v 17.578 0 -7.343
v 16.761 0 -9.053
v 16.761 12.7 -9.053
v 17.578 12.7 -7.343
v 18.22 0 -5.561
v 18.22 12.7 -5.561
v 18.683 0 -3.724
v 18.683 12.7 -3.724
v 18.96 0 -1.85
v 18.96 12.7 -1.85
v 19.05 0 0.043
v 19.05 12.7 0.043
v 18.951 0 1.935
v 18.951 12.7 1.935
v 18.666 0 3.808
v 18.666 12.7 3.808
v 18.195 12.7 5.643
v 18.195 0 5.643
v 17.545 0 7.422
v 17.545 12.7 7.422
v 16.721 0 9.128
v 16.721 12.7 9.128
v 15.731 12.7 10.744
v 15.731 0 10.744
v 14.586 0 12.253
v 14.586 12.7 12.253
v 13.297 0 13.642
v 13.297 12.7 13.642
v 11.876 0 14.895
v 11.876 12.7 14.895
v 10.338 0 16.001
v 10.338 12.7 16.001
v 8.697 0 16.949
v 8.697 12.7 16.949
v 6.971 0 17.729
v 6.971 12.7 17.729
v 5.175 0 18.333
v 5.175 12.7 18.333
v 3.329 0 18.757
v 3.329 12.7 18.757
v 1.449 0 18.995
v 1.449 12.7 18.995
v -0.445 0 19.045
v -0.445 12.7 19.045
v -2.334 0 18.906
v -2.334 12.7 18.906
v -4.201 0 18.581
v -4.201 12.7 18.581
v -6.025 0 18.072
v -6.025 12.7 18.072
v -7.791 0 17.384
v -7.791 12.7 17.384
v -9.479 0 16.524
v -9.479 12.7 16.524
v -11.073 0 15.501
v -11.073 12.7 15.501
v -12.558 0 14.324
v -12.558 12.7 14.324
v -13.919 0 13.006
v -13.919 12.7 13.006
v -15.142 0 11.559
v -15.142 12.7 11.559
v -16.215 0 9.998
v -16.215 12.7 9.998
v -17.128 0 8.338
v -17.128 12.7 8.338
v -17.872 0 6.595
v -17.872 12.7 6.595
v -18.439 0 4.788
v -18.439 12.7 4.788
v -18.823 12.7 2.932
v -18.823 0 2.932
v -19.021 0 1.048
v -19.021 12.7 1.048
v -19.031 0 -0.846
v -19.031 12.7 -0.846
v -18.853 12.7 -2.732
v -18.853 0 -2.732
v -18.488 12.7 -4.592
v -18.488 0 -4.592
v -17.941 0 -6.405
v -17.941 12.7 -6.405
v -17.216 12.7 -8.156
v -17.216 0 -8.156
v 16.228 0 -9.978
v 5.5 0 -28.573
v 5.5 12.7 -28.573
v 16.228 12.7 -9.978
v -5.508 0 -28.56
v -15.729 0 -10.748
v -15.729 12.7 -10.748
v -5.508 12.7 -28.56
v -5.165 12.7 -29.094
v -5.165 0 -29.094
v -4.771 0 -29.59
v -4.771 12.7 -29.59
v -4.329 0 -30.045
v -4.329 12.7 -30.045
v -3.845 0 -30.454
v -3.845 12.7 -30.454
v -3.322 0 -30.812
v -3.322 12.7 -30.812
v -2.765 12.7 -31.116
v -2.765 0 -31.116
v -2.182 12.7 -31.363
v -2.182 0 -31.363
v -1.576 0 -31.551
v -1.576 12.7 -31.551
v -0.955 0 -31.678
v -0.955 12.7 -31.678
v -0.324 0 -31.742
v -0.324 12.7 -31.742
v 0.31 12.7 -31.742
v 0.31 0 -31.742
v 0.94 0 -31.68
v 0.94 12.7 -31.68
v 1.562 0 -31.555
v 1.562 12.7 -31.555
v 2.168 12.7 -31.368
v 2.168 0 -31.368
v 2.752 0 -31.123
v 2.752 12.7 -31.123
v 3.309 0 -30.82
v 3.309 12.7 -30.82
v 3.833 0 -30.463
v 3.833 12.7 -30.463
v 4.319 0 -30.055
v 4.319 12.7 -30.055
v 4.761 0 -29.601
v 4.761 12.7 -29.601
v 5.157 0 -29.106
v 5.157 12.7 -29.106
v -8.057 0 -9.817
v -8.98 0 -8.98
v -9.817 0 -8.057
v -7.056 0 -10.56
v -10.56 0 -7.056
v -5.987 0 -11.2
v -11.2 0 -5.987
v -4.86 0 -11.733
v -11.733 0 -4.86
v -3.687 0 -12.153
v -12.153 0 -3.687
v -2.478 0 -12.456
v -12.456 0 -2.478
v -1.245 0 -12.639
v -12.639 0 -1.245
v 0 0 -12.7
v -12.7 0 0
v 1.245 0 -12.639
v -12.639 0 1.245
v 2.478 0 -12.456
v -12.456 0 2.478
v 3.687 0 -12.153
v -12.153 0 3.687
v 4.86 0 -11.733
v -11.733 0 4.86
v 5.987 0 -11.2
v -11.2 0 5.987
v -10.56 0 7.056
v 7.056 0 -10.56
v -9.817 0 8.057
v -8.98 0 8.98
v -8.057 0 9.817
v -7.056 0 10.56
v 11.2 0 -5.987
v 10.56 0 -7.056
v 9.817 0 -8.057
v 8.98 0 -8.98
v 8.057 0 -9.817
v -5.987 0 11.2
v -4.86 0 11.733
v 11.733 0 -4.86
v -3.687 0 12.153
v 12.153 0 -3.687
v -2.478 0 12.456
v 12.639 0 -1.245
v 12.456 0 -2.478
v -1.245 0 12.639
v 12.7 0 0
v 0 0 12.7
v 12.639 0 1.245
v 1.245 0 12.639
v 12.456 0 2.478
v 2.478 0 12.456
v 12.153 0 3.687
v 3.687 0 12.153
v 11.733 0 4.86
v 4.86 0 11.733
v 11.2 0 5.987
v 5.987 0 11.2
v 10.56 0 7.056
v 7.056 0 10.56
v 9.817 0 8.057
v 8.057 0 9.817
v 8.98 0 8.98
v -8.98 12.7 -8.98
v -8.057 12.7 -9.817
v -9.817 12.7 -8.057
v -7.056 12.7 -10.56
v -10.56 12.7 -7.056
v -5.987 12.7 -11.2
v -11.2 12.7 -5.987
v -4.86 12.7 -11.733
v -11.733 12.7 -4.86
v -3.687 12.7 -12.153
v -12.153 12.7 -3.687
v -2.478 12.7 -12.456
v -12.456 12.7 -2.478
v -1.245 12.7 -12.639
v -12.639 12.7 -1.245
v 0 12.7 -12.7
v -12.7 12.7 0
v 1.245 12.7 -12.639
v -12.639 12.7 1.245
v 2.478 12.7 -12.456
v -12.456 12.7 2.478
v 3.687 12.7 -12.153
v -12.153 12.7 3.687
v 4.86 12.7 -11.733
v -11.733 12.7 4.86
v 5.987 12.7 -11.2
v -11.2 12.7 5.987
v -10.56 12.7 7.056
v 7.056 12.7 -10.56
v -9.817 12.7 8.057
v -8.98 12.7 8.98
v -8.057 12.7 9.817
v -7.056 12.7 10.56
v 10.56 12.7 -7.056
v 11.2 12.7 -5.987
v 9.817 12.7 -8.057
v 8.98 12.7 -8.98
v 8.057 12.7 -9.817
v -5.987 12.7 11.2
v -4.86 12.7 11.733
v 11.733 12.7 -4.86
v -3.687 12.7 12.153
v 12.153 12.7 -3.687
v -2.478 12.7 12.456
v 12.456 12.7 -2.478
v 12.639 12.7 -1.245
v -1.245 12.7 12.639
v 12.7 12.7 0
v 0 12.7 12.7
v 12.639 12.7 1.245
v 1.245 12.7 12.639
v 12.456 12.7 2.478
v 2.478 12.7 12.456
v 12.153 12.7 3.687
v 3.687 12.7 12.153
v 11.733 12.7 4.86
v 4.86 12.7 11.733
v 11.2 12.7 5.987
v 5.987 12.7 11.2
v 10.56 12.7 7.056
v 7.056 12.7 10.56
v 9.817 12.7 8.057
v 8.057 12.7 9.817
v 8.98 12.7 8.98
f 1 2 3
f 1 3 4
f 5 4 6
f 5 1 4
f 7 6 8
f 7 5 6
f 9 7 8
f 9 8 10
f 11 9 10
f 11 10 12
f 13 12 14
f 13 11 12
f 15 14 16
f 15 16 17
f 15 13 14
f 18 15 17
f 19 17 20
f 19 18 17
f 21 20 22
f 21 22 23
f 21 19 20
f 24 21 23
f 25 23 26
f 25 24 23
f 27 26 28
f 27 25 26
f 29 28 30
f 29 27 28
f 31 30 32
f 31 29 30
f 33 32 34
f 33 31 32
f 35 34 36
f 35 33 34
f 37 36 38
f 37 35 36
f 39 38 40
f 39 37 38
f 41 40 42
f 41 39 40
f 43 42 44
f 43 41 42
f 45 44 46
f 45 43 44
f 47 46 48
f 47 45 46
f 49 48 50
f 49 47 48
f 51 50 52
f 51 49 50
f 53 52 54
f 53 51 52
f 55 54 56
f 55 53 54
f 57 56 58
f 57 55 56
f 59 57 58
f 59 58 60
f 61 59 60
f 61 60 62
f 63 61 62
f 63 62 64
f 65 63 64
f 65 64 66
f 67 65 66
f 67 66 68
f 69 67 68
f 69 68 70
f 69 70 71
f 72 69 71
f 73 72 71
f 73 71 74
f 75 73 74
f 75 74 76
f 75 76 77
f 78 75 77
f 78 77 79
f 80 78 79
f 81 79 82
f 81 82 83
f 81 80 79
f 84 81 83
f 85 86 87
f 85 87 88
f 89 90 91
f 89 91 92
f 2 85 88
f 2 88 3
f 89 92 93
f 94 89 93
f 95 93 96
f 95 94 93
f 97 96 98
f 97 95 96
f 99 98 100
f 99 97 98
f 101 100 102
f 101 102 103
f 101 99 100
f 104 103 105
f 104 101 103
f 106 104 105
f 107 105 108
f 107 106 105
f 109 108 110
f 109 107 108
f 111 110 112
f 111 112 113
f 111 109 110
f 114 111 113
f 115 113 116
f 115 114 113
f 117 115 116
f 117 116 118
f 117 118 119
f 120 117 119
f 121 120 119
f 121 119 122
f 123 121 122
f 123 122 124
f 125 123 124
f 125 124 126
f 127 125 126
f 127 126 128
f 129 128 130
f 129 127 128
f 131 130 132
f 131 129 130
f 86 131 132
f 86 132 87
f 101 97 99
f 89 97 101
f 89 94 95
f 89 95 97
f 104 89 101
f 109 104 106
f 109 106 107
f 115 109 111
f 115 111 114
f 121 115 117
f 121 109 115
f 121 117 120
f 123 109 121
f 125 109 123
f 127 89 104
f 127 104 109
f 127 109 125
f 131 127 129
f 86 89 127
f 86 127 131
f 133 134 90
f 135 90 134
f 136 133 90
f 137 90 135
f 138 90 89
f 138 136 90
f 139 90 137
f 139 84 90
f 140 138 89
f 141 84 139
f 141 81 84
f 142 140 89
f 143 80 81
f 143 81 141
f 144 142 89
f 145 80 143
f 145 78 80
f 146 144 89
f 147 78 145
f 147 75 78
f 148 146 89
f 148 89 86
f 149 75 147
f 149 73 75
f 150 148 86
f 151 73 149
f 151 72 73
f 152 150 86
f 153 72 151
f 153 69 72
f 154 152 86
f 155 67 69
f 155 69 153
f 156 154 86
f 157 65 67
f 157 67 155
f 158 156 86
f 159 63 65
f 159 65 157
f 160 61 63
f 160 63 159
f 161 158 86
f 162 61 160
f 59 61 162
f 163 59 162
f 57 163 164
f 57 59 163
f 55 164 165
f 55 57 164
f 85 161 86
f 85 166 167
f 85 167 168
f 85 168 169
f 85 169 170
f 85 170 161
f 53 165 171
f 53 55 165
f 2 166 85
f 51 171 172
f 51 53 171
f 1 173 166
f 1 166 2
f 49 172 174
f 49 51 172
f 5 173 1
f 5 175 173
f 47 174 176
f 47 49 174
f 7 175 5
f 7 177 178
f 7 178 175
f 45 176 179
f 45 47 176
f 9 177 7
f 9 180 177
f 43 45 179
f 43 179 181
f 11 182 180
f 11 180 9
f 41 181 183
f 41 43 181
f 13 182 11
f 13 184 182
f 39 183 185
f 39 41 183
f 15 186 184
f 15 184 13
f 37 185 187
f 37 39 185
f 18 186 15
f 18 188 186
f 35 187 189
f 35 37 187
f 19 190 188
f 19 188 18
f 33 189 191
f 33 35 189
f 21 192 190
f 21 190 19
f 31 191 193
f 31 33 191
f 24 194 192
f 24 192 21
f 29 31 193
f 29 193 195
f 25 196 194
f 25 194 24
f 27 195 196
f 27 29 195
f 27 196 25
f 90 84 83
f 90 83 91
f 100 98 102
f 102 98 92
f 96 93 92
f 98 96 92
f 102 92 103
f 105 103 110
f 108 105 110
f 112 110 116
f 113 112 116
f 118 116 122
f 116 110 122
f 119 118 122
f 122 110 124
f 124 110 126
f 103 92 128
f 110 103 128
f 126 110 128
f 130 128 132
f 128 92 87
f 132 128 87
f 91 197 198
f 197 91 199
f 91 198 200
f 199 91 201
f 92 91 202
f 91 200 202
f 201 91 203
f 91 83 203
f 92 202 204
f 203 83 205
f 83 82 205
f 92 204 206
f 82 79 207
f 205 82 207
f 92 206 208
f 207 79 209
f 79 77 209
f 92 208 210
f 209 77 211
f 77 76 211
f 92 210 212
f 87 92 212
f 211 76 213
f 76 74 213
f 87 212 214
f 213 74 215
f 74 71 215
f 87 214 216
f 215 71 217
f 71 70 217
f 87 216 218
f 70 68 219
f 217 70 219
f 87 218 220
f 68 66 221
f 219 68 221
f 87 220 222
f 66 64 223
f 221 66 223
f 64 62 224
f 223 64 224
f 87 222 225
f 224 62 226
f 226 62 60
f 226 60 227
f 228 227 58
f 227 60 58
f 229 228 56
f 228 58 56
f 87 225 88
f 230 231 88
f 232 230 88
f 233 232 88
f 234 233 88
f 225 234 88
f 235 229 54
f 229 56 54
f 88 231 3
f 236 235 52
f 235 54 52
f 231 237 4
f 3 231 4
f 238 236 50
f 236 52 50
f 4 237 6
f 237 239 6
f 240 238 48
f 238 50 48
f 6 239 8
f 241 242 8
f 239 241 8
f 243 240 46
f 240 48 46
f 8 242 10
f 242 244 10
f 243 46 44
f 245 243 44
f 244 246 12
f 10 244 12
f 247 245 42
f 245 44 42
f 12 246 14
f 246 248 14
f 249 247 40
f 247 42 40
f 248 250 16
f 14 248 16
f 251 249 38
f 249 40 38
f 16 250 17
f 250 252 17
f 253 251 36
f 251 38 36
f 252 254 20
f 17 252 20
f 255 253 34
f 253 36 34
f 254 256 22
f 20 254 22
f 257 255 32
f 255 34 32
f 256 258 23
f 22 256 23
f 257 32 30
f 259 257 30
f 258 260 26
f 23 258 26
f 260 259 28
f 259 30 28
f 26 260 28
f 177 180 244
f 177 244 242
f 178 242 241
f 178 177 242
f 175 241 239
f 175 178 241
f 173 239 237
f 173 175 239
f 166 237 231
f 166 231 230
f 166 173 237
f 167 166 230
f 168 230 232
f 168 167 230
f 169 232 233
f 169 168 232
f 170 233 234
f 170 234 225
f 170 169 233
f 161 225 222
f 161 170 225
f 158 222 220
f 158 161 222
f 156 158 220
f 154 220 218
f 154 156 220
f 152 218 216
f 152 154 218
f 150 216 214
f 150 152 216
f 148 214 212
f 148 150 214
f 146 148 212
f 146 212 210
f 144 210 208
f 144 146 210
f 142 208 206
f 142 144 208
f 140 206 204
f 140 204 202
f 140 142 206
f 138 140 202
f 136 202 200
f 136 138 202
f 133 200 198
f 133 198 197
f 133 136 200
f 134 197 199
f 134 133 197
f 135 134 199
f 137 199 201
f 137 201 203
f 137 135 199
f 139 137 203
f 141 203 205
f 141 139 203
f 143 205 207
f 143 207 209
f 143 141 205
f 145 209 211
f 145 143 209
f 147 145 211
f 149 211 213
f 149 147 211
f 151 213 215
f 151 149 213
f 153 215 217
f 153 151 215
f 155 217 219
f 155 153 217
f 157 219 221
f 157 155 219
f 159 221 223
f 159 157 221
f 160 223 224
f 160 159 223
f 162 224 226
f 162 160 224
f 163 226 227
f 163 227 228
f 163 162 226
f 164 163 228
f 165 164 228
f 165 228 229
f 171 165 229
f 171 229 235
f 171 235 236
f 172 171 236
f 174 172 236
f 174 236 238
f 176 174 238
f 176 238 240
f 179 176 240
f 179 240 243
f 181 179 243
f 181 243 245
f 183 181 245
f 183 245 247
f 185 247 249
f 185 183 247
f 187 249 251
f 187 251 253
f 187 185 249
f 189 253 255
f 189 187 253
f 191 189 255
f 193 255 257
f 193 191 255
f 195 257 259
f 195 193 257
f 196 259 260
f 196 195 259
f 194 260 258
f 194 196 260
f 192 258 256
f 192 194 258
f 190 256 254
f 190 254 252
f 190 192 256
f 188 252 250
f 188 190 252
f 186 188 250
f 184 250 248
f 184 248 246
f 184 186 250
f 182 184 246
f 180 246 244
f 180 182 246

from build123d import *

# Parameters (mm, degrees)
F1_DEPTH = 12.7


with BuildPart() as f1:
    # F0 (on Front) → F1 (new body)
    with BuildSketch(Plane.XZ):
        with BuildLine():
            Line((5.500342, -28.573128), (16.227658, -9.978257))
            Line((16.227658, -9.978257), (16.76142, -9.053028))
            ThreePointArc((16.76142, -9.053028), (0.502926, 19.04336), (-17.215894, -8.155703))
            Line((-17.215894, -8.155703), (-15.728529, -10.74783))
            Line((-15.728529, -10.74783), (-5.507707, -28.560326))
            ThreePointArc((-5.507707, -28.560326), (-0.007385, -31.749996), (5.500342, -28.573128))
        make_face()
        with BuildLine():
            ThreePointArc((0, -12.7), (-8.980256, 8.980256), (12.7, 0))
            ThreePointArc((12.7, 0), (8.980256, -8.980256), (0, -12.7))
        make_face(mode=Mode.SUBTRACT)
    extrude(amount=-F1_DEPTH)


solid = f1.part
